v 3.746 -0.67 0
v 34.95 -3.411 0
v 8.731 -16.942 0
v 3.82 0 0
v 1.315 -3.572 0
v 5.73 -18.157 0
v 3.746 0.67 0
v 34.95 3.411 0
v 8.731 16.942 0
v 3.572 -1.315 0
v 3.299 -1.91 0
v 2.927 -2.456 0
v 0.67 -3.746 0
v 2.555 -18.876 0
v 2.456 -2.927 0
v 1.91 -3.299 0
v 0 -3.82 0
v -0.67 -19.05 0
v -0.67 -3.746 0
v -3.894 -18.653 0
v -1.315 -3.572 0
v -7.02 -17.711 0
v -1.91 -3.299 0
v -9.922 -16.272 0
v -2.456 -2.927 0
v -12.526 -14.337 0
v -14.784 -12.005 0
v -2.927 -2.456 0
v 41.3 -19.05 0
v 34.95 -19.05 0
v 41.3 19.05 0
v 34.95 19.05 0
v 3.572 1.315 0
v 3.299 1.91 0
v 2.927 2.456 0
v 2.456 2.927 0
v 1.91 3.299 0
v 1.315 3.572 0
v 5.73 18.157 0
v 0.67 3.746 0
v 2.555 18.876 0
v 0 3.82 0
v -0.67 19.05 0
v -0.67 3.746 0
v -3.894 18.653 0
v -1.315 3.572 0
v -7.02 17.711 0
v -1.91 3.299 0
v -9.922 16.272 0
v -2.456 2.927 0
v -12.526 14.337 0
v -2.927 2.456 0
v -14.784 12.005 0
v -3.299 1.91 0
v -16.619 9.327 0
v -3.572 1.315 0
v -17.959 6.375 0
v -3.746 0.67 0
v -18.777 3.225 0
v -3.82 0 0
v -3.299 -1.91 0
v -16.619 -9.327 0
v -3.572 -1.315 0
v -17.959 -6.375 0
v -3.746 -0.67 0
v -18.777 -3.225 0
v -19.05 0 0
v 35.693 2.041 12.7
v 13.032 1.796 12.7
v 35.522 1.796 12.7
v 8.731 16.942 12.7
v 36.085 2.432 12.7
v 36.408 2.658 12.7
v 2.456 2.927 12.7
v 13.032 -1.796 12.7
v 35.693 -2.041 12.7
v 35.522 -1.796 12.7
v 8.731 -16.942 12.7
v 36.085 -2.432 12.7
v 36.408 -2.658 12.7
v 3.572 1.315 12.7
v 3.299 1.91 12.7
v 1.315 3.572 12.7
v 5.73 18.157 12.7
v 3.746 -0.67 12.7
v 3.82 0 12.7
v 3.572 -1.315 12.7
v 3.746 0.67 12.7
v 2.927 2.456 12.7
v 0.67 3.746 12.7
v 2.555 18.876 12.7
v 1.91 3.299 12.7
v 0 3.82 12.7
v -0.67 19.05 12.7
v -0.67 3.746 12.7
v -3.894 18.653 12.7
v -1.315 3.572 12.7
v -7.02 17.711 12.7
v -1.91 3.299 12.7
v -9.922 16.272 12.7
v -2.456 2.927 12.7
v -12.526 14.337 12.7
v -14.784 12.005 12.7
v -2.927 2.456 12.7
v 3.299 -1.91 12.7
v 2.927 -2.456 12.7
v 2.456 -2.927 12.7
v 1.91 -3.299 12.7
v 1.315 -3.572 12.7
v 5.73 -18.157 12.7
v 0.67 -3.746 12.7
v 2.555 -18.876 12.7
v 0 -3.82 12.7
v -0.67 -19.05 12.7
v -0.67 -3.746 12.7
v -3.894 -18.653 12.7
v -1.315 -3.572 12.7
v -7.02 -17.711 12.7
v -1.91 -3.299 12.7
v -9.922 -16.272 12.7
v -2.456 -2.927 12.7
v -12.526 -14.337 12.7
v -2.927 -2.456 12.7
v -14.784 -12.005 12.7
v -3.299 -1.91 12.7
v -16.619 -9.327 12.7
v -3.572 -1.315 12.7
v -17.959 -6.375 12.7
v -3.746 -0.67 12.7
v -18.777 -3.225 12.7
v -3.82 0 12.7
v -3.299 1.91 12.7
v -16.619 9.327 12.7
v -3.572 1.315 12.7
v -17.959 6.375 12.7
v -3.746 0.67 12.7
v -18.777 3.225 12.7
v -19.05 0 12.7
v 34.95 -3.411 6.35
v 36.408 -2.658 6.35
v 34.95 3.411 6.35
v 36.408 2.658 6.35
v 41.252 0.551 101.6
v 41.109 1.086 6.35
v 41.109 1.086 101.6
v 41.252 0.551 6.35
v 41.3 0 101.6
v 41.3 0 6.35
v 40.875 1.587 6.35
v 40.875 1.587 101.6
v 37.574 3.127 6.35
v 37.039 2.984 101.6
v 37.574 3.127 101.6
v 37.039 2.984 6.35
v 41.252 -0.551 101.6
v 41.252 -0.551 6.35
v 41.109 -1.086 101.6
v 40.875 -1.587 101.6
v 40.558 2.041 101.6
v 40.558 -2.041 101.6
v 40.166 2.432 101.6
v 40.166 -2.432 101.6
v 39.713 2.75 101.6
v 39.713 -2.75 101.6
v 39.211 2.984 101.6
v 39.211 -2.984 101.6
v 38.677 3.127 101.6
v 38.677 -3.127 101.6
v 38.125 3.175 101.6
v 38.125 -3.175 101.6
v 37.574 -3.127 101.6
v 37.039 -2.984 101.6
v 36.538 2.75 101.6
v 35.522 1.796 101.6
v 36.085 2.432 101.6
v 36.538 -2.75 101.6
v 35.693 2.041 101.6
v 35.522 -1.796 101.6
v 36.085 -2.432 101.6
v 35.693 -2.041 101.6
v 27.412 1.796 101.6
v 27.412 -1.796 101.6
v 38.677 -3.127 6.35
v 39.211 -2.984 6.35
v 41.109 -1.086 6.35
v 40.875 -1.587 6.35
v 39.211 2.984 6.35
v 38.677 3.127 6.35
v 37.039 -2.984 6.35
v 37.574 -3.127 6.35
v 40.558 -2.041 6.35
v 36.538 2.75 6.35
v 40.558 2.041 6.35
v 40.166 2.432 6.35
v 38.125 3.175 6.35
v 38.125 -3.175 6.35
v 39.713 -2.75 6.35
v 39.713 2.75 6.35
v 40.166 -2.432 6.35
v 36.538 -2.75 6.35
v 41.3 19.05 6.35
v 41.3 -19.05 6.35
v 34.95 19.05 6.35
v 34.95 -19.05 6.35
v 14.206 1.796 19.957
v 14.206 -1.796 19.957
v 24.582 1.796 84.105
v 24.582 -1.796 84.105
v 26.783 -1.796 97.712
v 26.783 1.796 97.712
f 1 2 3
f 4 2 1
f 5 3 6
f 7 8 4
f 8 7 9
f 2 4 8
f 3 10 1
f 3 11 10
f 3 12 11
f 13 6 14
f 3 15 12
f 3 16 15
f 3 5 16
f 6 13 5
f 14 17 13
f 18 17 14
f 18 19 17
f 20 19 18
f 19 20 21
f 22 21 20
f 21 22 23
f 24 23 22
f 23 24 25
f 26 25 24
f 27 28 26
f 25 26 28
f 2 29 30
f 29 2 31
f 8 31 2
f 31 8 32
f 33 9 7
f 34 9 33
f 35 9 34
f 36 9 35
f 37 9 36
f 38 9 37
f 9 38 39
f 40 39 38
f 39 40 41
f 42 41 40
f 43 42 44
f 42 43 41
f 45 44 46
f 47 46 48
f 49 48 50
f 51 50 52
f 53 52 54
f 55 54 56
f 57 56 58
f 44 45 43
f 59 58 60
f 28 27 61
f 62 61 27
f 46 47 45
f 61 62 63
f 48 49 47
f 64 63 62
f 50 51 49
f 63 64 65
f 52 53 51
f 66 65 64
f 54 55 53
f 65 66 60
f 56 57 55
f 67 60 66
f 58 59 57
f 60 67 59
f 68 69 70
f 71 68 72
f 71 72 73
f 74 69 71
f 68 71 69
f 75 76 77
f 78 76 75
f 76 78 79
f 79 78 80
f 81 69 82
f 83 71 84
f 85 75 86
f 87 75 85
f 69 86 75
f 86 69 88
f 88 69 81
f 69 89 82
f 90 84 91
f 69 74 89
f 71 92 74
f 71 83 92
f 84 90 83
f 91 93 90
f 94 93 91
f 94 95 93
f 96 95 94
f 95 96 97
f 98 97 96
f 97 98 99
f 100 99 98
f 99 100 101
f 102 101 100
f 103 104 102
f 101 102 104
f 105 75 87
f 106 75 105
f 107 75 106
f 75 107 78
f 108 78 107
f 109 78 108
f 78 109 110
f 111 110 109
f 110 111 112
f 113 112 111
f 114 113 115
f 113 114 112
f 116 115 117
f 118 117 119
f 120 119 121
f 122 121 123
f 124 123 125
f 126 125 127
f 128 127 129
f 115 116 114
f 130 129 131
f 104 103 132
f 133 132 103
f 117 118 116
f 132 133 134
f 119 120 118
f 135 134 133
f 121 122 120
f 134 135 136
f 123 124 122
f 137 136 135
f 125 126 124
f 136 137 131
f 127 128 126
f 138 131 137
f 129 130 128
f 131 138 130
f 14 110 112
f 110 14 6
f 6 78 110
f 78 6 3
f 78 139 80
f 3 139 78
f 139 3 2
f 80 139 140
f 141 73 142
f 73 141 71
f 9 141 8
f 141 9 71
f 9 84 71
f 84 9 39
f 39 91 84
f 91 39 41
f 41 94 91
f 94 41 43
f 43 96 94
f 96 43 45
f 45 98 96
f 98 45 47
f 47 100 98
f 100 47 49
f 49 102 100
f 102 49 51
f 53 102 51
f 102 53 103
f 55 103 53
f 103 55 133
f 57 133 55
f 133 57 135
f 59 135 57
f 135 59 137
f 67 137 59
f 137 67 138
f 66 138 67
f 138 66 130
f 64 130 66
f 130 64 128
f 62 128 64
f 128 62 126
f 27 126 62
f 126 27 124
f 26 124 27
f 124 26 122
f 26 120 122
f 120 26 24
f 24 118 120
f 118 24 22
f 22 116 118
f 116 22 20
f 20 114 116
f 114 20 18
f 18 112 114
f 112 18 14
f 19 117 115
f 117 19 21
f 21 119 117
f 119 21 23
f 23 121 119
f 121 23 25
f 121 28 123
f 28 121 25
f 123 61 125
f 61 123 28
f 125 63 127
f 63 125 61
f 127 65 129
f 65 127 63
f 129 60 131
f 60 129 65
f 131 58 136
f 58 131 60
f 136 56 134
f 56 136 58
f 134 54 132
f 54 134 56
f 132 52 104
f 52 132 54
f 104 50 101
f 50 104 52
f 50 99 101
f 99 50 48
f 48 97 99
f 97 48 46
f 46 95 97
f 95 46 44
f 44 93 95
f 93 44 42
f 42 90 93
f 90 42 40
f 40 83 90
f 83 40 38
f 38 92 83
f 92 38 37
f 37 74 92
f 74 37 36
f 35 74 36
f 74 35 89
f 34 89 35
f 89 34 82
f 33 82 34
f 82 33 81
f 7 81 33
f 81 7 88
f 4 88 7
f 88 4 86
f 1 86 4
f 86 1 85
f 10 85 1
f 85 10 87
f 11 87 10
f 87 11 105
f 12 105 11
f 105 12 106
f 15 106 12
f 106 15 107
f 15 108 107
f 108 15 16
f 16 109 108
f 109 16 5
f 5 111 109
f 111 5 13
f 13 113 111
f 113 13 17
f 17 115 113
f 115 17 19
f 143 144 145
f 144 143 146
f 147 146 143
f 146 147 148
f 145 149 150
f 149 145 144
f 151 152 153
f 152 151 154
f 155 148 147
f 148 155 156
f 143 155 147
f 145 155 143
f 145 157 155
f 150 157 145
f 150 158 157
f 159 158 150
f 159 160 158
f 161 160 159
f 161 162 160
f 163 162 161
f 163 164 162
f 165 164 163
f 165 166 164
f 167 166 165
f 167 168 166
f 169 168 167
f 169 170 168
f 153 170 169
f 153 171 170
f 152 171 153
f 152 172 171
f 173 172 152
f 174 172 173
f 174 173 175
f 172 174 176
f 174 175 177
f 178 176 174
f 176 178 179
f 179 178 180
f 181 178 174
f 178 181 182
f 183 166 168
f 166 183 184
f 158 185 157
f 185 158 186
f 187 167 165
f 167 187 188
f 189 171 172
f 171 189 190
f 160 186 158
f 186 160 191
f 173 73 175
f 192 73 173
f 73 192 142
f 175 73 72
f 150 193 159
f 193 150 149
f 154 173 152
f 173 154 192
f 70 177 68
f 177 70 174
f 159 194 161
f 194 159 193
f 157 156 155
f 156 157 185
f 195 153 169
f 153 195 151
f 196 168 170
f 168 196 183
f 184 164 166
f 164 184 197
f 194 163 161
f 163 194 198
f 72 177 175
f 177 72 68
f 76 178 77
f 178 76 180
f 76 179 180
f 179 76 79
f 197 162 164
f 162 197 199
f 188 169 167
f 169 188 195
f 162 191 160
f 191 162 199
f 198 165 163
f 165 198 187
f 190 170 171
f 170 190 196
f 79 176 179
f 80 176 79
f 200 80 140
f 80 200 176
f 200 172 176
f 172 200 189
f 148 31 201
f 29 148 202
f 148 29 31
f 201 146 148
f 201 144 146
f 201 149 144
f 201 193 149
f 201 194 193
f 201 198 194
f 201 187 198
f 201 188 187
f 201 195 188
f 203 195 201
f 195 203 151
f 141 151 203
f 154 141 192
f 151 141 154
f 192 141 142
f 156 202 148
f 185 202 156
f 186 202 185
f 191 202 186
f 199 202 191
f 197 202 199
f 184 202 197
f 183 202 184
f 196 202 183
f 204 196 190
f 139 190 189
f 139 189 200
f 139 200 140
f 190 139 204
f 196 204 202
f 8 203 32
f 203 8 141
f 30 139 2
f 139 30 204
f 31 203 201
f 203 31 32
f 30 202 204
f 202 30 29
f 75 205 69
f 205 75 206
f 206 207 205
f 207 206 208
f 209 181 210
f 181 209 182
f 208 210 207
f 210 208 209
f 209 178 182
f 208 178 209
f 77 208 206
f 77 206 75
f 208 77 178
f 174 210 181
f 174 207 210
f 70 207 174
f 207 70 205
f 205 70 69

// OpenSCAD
h_spire = 4*25.4;
h_bar = .25*25.4;

linear_extrude( height = 0.5*25.4 )
scale( [25.4,25.4] )
    import ( file = "widgetbase.dxf" , layer = "0" , $fn=36);

translate([1.501*25.4,0,0])
    cylinder(d=.25*25.4, h=h_spire, $fn=36);
    
// A "bar" for linear calibration
xd = (1.501 + .25/2);
translate([xd-.25/2,0,0.25/2]*25.4)
    cube([.25,1.5,.25]*25.4, center=true);
    
// A "sail" for spire reinforcement
translate([35,0,h_bar])
linear_extrude(height=h_spire-h_bar, scale=[.33,1])
scale([.75,.1,0]*25.4)
translate([-0.5,0,0])
rotate([0,0,45])
    circle(1, $fn=4);
